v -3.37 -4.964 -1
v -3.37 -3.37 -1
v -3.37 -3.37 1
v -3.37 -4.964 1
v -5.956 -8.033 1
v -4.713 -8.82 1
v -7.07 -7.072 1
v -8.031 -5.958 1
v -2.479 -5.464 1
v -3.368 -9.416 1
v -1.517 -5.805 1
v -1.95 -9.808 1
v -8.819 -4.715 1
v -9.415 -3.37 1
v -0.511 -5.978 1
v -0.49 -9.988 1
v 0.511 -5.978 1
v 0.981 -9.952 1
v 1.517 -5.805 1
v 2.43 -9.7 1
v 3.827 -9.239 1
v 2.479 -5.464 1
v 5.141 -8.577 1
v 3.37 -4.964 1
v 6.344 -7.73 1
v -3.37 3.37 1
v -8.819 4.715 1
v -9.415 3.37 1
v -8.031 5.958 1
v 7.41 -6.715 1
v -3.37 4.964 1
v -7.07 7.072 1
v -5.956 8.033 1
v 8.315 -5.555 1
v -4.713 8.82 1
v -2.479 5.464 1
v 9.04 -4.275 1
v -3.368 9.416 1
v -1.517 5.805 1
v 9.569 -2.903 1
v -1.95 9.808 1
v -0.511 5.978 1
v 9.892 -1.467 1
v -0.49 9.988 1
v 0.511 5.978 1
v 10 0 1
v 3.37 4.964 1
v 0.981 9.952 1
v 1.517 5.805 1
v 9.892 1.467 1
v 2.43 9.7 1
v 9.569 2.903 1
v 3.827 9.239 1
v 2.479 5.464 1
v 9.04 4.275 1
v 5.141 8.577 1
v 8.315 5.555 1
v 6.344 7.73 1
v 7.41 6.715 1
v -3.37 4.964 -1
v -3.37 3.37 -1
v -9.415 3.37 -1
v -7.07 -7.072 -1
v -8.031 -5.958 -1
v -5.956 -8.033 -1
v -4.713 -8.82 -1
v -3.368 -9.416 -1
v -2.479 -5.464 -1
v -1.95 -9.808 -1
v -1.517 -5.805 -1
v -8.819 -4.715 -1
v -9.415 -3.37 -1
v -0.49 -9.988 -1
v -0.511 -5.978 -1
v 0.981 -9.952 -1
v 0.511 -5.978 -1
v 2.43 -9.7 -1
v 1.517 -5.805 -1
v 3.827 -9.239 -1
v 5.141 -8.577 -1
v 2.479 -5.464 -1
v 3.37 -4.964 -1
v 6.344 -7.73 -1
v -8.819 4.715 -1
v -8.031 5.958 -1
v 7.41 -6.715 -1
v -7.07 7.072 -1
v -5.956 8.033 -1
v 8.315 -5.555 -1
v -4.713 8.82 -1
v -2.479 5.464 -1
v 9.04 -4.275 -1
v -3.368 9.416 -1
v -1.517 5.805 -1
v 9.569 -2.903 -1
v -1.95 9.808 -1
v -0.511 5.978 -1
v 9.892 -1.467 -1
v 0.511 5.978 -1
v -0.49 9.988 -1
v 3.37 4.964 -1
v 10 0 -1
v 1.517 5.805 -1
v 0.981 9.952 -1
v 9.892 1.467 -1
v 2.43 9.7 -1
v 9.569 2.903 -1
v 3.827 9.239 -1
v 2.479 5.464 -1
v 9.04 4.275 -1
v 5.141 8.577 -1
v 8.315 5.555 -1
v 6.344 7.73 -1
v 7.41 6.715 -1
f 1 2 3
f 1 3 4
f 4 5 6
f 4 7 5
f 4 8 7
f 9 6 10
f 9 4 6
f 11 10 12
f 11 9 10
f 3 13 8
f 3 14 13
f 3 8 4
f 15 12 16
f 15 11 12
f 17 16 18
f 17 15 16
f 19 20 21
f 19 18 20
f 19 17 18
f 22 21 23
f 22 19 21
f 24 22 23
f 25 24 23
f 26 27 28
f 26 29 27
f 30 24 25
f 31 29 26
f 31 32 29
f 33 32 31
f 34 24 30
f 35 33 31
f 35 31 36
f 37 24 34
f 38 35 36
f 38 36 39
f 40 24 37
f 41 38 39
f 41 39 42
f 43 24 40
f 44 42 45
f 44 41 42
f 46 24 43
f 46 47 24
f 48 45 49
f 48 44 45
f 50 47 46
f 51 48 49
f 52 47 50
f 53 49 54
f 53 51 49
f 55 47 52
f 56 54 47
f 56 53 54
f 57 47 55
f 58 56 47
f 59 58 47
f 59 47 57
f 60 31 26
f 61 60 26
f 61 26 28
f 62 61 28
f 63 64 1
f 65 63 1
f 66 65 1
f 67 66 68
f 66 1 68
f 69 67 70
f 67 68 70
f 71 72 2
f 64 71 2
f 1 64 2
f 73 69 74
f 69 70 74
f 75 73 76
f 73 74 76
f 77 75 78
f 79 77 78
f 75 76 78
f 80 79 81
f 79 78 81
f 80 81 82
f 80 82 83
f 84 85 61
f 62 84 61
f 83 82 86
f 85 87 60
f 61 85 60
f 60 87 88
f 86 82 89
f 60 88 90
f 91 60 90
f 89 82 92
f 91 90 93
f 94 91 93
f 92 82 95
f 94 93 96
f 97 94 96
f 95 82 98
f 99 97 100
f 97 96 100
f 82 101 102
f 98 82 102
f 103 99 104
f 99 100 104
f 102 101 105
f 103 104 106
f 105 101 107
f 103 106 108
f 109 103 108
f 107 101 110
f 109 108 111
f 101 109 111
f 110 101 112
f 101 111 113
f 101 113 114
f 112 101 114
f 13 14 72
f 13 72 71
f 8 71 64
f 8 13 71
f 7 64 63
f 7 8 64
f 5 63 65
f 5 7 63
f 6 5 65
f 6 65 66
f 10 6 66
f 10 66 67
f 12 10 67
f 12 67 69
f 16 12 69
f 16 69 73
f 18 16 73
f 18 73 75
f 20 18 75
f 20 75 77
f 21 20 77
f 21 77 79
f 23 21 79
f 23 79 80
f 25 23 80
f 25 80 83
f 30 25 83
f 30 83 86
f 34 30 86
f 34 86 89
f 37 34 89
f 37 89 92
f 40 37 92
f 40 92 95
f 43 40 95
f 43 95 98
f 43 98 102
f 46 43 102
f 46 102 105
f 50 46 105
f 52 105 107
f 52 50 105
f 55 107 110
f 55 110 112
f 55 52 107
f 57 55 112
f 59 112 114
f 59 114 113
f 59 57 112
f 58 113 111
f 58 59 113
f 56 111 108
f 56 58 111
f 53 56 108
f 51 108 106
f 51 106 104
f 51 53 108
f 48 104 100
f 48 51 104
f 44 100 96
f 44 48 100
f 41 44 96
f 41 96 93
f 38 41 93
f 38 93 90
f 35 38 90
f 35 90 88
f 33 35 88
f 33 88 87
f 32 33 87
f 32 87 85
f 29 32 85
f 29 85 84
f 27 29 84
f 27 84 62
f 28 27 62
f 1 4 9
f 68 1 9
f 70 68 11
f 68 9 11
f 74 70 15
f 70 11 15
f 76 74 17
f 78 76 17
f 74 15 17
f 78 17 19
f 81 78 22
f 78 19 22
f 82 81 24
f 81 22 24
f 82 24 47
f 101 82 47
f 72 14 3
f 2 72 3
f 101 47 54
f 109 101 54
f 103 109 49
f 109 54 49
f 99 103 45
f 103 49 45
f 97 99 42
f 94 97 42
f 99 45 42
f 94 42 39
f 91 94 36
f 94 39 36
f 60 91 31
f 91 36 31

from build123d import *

# Parameters (mm, degrees)
SCHIZZO1_R                   = 10
ESTRUSIONE_ESTRUSIONE1_DEPTH = 1
TAGLIO_ESTRUSIONE1_DEPTH     = 15.282856857


with BuildPart() as part:
    # Schizzo1 → Estrusione-Estrusione1 (new, symmetric)
    with BuildSketch(Plane.XY):
        Circle(SCHIZZO1_R)
    extrude(amount=ESTRUSIONE_ESTRUSIONE1_DEPTH, both=True)

    # Schizzo2 → Taglio-Estrusione1 (cut, through all)
    with BuildSketch(Plane.XY.offset(1)):
        with BuildLine():
            Line((-3.37, -3.37), (-3.37, 3.37))
            Line((-3.37, 3.37), (-9.415046468, 3.37))
            ThreePointArc((-9.415046468, 3.37), (-10, 0), (-9.415046468, -3.37))
            Line((-9.415046468, -3.37), (-3.37, -3.37))
        make_face()
        with BuildLine():
            Line((-3.37, 4.964181705), (-3.37, -4.964181705))
            ThreePointArc((-3.37, -4.964181705), (0, -6), (3.37, -4.964181705))
            Line((3.37, -4.964181705), (3.37, 4.964181705))
            ThreePointArc((3.37, 4.964181705), (0, 6), (-3.37, 4.964181705))
        make_face()
    extrude(amount=-TAGLIO_ESTRUSIONE1_DEPTH, mode=Mode.SUBTRACT)


solid = part.part
